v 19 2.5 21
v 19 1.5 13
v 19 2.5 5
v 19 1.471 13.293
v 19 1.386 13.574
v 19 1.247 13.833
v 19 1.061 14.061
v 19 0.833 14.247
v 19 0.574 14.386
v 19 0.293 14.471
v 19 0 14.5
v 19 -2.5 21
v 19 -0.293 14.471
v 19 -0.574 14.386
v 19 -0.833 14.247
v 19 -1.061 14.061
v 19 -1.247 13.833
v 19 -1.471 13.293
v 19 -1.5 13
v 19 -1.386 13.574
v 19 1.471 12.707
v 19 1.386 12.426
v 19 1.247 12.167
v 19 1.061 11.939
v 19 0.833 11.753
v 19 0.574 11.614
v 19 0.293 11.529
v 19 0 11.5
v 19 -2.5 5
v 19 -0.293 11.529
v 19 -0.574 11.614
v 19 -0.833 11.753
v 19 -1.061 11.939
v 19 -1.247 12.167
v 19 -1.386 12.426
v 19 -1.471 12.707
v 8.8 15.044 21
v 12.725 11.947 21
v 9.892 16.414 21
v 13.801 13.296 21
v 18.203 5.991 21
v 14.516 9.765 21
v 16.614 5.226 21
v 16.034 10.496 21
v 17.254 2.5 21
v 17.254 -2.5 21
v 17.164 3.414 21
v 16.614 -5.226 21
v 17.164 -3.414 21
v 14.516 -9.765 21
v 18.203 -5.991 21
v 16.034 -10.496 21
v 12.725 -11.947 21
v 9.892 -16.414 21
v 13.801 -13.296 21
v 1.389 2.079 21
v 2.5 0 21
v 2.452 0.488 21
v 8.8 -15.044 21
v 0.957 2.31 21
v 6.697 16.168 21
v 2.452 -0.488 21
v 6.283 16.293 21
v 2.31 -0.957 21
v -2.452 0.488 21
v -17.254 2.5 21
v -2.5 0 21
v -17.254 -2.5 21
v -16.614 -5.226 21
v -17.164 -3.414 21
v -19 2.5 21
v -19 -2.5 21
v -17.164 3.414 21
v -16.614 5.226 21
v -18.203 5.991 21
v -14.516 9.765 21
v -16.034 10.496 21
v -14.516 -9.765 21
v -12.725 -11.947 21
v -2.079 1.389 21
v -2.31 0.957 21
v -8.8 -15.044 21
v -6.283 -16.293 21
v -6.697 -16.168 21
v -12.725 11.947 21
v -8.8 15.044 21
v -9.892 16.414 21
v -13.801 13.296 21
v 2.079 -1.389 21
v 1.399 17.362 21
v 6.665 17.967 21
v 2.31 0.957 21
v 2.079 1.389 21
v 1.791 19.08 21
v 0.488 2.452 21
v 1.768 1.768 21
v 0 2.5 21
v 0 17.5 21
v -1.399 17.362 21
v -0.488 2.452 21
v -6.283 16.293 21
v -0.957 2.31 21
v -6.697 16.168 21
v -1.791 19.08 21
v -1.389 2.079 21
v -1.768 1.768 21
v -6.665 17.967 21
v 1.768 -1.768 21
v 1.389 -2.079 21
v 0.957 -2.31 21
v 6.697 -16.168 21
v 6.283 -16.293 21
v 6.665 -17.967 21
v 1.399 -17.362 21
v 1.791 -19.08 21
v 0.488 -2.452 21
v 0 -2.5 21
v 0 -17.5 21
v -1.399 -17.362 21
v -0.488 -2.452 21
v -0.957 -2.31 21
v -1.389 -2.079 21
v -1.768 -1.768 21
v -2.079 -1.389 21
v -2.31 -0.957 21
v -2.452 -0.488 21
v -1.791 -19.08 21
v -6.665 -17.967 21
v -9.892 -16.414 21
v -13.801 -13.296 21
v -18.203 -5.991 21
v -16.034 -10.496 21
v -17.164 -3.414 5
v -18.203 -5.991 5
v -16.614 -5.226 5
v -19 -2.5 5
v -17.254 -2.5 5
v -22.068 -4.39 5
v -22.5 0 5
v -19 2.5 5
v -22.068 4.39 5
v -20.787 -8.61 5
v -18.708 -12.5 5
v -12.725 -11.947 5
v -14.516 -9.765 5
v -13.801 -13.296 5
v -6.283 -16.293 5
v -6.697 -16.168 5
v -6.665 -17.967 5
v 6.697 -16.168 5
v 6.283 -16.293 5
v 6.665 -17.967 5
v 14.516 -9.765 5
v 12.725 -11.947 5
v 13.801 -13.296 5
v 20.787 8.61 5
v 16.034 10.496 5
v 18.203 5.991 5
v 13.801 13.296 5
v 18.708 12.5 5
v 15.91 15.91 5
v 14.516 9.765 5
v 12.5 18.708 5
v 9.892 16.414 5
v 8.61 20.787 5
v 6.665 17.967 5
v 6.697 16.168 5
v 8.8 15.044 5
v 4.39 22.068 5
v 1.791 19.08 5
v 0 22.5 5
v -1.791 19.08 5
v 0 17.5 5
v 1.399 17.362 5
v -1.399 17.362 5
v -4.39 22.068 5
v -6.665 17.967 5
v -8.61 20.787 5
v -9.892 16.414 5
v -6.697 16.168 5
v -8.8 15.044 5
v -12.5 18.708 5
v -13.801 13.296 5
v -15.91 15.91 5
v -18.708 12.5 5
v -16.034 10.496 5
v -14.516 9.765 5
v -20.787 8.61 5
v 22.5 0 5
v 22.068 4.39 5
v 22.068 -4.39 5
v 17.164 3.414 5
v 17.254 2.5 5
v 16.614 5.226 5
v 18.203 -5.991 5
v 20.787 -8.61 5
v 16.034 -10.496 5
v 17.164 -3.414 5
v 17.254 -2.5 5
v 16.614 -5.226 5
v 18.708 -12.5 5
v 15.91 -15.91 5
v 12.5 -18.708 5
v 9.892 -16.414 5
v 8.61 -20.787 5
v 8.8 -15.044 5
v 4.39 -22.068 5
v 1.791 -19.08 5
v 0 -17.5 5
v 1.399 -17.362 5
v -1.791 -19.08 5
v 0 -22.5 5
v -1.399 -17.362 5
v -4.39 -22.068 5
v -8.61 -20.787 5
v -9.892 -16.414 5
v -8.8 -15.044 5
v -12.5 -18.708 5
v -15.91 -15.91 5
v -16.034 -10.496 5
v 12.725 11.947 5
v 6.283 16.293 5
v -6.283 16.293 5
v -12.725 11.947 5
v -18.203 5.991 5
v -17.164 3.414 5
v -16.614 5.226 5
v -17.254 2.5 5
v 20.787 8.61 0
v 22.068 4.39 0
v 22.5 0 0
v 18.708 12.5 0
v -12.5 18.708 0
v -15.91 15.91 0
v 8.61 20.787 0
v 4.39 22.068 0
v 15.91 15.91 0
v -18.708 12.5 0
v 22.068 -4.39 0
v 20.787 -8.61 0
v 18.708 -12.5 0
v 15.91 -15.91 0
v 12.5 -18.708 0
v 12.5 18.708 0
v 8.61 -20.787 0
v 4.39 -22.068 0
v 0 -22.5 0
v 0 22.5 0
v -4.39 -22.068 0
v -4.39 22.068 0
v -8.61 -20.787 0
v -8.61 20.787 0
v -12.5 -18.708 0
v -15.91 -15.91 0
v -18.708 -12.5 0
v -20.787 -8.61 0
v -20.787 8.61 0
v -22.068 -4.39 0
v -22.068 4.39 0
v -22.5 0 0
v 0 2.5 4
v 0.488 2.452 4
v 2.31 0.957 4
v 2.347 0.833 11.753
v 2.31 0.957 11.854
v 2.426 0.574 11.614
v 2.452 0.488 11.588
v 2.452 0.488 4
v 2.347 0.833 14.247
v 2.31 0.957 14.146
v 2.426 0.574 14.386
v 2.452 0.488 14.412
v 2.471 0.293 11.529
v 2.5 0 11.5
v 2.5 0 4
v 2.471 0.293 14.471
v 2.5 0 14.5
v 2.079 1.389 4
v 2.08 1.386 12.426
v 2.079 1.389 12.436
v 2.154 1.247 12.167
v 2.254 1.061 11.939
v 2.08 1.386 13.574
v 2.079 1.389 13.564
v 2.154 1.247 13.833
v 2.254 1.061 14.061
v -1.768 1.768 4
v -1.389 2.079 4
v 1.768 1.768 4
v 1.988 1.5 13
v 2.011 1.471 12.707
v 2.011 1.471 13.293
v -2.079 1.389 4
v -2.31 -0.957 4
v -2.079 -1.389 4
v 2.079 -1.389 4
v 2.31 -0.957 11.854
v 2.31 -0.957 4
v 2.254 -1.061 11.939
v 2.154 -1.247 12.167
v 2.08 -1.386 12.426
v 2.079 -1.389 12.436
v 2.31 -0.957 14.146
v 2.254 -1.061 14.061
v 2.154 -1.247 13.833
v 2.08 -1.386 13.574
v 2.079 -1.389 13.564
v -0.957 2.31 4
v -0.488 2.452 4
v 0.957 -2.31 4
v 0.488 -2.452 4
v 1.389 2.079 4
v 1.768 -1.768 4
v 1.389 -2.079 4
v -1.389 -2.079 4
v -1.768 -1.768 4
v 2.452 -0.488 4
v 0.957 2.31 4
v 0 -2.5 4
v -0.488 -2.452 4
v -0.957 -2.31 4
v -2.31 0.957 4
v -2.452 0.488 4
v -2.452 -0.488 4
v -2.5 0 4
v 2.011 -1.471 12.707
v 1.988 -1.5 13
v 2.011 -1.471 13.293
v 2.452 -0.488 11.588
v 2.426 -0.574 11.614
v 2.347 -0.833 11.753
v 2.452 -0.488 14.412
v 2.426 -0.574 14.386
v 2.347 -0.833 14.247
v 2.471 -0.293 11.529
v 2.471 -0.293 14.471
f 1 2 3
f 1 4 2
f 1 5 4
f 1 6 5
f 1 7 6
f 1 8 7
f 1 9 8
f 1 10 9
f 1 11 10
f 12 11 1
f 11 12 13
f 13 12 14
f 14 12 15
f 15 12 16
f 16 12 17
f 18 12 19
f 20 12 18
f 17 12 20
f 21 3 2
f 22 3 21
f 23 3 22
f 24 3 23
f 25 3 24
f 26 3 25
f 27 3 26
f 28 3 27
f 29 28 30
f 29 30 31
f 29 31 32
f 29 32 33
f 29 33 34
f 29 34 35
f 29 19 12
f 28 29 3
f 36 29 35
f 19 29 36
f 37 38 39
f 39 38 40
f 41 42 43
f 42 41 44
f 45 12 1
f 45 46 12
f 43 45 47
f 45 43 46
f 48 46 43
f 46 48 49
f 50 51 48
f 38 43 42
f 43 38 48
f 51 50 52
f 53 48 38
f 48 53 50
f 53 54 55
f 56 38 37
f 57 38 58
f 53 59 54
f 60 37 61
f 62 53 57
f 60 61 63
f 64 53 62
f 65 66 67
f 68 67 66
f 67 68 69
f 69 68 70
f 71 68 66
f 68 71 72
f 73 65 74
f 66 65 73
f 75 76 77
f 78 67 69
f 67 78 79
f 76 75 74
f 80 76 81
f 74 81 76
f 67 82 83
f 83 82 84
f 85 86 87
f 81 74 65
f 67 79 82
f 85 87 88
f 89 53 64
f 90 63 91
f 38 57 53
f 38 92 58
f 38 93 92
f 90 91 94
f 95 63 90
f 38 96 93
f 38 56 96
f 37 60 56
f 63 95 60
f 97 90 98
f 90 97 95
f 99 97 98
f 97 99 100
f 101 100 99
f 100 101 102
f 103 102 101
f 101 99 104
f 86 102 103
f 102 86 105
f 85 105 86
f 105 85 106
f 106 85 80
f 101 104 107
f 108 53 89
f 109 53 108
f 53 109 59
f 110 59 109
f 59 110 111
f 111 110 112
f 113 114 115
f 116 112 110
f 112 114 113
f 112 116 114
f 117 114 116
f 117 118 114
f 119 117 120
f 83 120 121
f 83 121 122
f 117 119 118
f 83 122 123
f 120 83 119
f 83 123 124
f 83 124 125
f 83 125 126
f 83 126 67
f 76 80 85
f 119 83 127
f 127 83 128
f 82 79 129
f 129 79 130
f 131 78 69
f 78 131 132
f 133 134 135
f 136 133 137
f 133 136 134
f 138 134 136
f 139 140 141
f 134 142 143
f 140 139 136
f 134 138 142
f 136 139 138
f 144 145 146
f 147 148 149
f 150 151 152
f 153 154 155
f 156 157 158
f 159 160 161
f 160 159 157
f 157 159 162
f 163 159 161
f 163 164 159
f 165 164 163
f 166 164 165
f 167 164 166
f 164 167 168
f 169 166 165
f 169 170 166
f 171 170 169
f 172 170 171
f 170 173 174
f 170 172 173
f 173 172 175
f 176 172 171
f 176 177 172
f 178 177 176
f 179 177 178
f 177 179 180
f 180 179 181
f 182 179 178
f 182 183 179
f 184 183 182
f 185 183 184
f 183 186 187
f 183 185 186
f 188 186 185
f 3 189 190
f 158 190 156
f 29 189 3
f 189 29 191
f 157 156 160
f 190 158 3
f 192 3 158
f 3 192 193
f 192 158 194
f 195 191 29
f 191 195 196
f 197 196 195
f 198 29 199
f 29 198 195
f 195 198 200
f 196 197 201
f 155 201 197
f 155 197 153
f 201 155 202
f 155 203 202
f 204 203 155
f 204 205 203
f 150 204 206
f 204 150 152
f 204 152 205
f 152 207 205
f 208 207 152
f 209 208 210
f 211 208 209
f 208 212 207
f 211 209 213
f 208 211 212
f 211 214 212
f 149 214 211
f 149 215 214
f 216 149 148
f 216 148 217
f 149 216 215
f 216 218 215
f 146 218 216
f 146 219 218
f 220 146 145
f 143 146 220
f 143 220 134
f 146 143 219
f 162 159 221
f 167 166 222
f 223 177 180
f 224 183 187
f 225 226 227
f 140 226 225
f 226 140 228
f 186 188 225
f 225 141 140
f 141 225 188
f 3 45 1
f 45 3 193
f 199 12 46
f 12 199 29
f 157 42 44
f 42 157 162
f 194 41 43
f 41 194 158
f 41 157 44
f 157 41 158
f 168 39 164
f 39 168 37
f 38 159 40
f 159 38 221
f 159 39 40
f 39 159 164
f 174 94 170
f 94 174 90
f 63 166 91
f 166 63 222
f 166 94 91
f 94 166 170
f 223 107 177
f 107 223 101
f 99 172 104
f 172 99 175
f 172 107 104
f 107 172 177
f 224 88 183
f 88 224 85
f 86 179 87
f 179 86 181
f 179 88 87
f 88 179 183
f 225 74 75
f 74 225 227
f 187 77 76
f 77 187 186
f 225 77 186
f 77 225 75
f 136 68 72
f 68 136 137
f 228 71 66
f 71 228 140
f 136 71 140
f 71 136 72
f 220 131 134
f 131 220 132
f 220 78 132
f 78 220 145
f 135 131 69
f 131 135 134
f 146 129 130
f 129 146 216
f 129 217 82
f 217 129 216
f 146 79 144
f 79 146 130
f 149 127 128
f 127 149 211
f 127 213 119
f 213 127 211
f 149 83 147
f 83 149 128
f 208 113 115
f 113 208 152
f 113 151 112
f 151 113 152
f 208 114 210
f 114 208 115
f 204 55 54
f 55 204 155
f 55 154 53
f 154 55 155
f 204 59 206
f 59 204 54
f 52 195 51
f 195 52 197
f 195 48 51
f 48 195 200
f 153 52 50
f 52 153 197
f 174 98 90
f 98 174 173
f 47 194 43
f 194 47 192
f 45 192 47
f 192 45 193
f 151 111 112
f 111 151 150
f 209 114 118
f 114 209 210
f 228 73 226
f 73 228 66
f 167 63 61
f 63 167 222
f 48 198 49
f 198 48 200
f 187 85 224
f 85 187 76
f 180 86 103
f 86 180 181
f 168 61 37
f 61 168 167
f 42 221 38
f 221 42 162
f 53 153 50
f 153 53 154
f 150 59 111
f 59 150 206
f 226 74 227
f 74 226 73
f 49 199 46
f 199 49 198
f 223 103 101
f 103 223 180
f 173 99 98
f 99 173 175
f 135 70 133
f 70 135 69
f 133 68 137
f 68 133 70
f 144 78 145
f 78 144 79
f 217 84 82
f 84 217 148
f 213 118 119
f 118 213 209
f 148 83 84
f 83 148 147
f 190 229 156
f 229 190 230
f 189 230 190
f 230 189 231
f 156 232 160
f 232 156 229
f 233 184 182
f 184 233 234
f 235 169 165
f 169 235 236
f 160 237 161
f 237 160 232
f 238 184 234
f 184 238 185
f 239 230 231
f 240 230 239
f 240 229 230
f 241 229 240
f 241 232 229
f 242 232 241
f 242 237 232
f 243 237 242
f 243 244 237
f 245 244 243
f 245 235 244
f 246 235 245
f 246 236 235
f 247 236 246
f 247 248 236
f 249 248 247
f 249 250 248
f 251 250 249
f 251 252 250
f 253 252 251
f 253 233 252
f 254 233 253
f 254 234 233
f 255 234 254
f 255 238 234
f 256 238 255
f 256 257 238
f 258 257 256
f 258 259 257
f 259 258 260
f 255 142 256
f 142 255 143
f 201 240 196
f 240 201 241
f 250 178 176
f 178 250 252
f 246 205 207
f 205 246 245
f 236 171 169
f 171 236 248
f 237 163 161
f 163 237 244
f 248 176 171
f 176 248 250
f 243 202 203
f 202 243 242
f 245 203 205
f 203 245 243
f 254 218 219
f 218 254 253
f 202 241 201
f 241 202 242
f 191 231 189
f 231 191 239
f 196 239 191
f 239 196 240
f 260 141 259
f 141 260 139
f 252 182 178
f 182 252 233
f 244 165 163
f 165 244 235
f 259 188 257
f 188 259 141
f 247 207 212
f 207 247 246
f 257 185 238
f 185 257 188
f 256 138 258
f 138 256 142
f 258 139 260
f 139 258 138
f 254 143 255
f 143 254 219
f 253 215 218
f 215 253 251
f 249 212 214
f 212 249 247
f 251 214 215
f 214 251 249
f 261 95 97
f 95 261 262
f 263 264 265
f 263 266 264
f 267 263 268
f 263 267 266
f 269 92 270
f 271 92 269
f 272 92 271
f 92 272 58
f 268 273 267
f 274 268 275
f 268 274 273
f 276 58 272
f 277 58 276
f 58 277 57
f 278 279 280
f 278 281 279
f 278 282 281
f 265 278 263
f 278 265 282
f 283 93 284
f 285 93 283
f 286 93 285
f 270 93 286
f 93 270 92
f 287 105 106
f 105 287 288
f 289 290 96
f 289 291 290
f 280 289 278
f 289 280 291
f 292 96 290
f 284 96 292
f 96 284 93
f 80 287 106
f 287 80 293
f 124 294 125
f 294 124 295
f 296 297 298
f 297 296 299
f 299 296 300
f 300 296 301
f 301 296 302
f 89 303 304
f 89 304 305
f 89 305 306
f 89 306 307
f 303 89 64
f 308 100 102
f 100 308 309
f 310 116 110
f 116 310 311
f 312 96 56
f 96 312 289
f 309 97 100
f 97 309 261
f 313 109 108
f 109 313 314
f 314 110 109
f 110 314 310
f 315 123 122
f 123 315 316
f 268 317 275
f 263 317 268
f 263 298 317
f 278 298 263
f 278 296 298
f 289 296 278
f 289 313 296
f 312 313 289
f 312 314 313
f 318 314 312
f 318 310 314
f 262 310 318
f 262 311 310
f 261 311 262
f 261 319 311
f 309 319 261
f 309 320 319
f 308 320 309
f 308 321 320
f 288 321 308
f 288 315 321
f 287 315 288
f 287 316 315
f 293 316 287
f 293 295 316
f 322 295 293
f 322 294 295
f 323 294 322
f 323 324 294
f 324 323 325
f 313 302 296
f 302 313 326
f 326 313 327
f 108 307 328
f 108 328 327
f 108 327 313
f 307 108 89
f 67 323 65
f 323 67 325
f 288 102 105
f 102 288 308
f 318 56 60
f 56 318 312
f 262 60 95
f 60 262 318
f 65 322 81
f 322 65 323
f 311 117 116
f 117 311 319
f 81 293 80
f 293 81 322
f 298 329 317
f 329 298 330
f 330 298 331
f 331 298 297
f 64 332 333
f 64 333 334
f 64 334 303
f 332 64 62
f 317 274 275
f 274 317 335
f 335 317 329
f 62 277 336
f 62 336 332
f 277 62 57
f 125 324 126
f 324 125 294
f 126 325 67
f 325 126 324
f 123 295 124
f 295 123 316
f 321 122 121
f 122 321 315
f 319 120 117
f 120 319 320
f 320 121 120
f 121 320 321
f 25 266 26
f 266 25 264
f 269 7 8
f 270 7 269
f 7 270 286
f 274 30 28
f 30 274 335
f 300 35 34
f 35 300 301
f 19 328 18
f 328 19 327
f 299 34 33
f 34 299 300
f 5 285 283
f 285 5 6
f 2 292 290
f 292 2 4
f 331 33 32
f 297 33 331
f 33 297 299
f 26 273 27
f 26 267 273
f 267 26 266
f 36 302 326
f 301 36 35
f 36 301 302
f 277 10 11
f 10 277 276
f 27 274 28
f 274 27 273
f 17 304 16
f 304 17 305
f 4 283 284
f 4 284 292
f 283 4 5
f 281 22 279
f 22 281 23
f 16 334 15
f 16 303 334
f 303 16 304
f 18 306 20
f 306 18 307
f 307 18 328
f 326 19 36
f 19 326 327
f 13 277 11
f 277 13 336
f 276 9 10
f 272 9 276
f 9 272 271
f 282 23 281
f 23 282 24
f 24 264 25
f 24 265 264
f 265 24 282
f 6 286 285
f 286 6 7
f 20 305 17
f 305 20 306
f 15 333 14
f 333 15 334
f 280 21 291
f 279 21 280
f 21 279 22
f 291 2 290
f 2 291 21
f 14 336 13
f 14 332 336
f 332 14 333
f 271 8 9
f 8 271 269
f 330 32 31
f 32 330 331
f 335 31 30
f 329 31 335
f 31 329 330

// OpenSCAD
$fn = 32;

// ----------------------------------------------------------------------
// Control knob: skirt knob with grip ribs
// ----------------------------------------------------------------------

// --- parameters (mm) ---
skirt_d = 45;             // skirt diameter
skirt_t = 5;              // skirt thickness
rib_w = 5;                // grip rib width
rib_out = 2.5;            // grip rib radial protrusion
n_ribs = 14;              // number of grip ribs
knob_d = 35;              // knob body diameter
knob_h = 16;              // knob body height
bore_d = 5;               // shaft bore diameter
set_d = 3;                // set screw bore diameter
fit_tol = 0.05;           // tolerance for press fits, mm
free_tol = 0.3;           // tolerance for clearance fits, mm

rib_step = 360 / n_ribs;  // rib angular step
total_h = skirt_t + knob_h;  // overall height

difference() {
  union() {
    translate([0, 0, skirt_t]) cylinder(h = knob_h, d = knob_d);
    cylinder(h = skirt_t, d = skirt_d);
    for (i = [0 : n_ribs - 1])
      rotate([0, 0, i * rib_step])
        translate([knob_d / 2 - 1, -rib_w / 2, skirt_t])
          cube([rib_out, rib_w, knob_h]);
  }
  translate([0, 0, skirt_t - 1]) cylinder(h = knob_h + 2, d = bore_d);
  translate([-1, 0, skirt_t + knob_h / 2]) rotate([0, 90, 0])
    cylinder(h = knob_d / 2 + bore_d / 2 + 2, d = set_d);
}
